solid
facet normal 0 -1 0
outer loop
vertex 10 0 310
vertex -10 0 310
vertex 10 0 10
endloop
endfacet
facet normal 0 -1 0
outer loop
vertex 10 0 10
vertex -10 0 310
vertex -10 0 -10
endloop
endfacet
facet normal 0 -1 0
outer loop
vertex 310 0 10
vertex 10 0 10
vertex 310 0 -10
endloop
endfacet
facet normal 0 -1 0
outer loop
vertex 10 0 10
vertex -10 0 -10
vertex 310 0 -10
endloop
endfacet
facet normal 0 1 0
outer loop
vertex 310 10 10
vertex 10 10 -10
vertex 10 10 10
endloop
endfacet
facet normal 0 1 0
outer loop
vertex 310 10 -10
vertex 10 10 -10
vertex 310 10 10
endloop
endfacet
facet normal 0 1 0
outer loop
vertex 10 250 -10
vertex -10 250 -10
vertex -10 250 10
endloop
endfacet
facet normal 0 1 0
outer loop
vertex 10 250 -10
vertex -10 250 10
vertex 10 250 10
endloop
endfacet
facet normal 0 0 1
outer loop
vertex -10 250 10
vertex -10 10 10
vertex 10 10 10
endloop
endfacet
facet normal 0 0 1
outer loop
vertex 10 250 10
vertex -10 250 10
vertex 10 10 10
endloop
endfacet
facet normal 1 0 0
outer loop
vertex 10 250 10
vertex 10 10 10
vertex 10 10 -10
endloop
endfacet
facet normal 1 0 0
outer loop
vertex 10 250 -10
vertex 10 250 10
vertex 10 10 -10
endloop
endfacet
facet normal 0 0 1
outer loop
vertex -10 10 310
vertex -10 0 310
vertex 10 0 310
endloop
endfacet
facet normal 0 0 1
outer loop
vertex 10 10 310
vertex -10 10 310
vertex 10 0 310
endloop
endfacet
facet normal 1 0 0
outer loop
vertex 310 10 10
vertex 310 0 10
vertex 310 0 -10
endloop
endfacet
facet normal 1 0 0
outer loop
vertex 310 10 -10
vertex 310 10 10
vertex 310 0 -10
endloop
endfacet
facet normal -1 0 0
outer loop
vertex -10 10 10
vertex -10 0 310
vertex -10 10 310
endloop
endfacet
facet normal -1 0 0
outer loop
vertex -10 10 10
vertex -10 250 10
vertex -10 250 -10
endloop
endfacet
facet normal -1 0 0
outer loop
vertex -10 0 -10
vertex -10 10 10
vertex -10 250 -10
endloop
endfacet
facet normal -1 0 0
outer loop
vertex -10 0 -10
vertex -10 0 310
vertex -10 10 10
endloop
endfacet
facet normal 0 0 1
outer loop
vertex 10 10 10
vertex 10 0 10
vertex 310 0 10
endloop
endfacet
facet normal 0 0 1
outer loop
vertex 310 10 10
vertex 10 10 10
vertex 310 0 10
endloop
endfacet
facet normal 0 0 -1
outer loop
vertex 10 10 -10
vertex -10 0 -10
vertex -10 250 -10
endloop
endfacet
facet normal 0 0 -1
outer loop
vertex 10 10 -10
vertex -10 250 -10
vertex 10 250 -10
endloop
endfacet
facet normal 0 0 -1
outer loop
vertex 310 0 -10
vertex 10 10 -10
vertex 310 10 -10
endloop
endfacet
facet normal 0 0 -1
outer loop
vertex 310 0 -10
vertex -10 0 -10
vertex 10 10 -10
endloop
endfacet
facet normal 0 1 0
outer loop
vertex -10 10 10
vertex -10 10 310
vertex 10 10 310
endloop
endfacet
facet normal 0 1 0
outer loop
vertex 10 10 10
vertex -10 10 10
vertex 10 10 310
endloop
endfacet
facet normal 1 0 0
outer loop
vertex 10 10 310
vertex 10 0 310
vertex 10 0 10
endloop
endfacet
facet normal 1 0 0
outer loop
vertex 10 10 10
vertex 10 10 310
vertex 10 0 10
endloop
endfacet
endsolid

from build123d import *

# Parameters (mm, degrees)
SKETCH1_W           = 20
SKETCH1_H           = 20
BOSS_EXTRUDE1_DEPTH = 250
SKETCH2_W           = 20
SKETCH2_H           = 300
SKETCH2_W_2         = 300
SKETCH2_H_2         = 20
BOSS_EXTRUDE2_DEPTH = 10


with BuildPart() as part:
    # Sketch1 → Boss-Extrude1 (new body)
    with BuildSketch(Plane(origin=(0, 0, 0), x_dir=(1, 0, 0), z_dir=(0, 1, 0))):
        Rectangle(SKETCH1_W, SKETCH1_H)
    extrude(amount=BOSS_EXTRUDE1_DEPTH)

    # Sketch2 → Boss-Extrude2 (add)
    with BuildSketch(Plane(origin=(0, 0, 0), x_dir=(1, 0, 0), z_dir=(0, 1, 0))):
        with Locations((0, -160)):
            Rectangle(SKETCH2_W, SKETCH2_H)
        with Locations((160, 0)):
            Rectangle(SKETCH2_W_2, SKETCH2_H_2)
    extrude(amount=BOSS_EXTRUDE2_DEPTH)


solid = part.part
